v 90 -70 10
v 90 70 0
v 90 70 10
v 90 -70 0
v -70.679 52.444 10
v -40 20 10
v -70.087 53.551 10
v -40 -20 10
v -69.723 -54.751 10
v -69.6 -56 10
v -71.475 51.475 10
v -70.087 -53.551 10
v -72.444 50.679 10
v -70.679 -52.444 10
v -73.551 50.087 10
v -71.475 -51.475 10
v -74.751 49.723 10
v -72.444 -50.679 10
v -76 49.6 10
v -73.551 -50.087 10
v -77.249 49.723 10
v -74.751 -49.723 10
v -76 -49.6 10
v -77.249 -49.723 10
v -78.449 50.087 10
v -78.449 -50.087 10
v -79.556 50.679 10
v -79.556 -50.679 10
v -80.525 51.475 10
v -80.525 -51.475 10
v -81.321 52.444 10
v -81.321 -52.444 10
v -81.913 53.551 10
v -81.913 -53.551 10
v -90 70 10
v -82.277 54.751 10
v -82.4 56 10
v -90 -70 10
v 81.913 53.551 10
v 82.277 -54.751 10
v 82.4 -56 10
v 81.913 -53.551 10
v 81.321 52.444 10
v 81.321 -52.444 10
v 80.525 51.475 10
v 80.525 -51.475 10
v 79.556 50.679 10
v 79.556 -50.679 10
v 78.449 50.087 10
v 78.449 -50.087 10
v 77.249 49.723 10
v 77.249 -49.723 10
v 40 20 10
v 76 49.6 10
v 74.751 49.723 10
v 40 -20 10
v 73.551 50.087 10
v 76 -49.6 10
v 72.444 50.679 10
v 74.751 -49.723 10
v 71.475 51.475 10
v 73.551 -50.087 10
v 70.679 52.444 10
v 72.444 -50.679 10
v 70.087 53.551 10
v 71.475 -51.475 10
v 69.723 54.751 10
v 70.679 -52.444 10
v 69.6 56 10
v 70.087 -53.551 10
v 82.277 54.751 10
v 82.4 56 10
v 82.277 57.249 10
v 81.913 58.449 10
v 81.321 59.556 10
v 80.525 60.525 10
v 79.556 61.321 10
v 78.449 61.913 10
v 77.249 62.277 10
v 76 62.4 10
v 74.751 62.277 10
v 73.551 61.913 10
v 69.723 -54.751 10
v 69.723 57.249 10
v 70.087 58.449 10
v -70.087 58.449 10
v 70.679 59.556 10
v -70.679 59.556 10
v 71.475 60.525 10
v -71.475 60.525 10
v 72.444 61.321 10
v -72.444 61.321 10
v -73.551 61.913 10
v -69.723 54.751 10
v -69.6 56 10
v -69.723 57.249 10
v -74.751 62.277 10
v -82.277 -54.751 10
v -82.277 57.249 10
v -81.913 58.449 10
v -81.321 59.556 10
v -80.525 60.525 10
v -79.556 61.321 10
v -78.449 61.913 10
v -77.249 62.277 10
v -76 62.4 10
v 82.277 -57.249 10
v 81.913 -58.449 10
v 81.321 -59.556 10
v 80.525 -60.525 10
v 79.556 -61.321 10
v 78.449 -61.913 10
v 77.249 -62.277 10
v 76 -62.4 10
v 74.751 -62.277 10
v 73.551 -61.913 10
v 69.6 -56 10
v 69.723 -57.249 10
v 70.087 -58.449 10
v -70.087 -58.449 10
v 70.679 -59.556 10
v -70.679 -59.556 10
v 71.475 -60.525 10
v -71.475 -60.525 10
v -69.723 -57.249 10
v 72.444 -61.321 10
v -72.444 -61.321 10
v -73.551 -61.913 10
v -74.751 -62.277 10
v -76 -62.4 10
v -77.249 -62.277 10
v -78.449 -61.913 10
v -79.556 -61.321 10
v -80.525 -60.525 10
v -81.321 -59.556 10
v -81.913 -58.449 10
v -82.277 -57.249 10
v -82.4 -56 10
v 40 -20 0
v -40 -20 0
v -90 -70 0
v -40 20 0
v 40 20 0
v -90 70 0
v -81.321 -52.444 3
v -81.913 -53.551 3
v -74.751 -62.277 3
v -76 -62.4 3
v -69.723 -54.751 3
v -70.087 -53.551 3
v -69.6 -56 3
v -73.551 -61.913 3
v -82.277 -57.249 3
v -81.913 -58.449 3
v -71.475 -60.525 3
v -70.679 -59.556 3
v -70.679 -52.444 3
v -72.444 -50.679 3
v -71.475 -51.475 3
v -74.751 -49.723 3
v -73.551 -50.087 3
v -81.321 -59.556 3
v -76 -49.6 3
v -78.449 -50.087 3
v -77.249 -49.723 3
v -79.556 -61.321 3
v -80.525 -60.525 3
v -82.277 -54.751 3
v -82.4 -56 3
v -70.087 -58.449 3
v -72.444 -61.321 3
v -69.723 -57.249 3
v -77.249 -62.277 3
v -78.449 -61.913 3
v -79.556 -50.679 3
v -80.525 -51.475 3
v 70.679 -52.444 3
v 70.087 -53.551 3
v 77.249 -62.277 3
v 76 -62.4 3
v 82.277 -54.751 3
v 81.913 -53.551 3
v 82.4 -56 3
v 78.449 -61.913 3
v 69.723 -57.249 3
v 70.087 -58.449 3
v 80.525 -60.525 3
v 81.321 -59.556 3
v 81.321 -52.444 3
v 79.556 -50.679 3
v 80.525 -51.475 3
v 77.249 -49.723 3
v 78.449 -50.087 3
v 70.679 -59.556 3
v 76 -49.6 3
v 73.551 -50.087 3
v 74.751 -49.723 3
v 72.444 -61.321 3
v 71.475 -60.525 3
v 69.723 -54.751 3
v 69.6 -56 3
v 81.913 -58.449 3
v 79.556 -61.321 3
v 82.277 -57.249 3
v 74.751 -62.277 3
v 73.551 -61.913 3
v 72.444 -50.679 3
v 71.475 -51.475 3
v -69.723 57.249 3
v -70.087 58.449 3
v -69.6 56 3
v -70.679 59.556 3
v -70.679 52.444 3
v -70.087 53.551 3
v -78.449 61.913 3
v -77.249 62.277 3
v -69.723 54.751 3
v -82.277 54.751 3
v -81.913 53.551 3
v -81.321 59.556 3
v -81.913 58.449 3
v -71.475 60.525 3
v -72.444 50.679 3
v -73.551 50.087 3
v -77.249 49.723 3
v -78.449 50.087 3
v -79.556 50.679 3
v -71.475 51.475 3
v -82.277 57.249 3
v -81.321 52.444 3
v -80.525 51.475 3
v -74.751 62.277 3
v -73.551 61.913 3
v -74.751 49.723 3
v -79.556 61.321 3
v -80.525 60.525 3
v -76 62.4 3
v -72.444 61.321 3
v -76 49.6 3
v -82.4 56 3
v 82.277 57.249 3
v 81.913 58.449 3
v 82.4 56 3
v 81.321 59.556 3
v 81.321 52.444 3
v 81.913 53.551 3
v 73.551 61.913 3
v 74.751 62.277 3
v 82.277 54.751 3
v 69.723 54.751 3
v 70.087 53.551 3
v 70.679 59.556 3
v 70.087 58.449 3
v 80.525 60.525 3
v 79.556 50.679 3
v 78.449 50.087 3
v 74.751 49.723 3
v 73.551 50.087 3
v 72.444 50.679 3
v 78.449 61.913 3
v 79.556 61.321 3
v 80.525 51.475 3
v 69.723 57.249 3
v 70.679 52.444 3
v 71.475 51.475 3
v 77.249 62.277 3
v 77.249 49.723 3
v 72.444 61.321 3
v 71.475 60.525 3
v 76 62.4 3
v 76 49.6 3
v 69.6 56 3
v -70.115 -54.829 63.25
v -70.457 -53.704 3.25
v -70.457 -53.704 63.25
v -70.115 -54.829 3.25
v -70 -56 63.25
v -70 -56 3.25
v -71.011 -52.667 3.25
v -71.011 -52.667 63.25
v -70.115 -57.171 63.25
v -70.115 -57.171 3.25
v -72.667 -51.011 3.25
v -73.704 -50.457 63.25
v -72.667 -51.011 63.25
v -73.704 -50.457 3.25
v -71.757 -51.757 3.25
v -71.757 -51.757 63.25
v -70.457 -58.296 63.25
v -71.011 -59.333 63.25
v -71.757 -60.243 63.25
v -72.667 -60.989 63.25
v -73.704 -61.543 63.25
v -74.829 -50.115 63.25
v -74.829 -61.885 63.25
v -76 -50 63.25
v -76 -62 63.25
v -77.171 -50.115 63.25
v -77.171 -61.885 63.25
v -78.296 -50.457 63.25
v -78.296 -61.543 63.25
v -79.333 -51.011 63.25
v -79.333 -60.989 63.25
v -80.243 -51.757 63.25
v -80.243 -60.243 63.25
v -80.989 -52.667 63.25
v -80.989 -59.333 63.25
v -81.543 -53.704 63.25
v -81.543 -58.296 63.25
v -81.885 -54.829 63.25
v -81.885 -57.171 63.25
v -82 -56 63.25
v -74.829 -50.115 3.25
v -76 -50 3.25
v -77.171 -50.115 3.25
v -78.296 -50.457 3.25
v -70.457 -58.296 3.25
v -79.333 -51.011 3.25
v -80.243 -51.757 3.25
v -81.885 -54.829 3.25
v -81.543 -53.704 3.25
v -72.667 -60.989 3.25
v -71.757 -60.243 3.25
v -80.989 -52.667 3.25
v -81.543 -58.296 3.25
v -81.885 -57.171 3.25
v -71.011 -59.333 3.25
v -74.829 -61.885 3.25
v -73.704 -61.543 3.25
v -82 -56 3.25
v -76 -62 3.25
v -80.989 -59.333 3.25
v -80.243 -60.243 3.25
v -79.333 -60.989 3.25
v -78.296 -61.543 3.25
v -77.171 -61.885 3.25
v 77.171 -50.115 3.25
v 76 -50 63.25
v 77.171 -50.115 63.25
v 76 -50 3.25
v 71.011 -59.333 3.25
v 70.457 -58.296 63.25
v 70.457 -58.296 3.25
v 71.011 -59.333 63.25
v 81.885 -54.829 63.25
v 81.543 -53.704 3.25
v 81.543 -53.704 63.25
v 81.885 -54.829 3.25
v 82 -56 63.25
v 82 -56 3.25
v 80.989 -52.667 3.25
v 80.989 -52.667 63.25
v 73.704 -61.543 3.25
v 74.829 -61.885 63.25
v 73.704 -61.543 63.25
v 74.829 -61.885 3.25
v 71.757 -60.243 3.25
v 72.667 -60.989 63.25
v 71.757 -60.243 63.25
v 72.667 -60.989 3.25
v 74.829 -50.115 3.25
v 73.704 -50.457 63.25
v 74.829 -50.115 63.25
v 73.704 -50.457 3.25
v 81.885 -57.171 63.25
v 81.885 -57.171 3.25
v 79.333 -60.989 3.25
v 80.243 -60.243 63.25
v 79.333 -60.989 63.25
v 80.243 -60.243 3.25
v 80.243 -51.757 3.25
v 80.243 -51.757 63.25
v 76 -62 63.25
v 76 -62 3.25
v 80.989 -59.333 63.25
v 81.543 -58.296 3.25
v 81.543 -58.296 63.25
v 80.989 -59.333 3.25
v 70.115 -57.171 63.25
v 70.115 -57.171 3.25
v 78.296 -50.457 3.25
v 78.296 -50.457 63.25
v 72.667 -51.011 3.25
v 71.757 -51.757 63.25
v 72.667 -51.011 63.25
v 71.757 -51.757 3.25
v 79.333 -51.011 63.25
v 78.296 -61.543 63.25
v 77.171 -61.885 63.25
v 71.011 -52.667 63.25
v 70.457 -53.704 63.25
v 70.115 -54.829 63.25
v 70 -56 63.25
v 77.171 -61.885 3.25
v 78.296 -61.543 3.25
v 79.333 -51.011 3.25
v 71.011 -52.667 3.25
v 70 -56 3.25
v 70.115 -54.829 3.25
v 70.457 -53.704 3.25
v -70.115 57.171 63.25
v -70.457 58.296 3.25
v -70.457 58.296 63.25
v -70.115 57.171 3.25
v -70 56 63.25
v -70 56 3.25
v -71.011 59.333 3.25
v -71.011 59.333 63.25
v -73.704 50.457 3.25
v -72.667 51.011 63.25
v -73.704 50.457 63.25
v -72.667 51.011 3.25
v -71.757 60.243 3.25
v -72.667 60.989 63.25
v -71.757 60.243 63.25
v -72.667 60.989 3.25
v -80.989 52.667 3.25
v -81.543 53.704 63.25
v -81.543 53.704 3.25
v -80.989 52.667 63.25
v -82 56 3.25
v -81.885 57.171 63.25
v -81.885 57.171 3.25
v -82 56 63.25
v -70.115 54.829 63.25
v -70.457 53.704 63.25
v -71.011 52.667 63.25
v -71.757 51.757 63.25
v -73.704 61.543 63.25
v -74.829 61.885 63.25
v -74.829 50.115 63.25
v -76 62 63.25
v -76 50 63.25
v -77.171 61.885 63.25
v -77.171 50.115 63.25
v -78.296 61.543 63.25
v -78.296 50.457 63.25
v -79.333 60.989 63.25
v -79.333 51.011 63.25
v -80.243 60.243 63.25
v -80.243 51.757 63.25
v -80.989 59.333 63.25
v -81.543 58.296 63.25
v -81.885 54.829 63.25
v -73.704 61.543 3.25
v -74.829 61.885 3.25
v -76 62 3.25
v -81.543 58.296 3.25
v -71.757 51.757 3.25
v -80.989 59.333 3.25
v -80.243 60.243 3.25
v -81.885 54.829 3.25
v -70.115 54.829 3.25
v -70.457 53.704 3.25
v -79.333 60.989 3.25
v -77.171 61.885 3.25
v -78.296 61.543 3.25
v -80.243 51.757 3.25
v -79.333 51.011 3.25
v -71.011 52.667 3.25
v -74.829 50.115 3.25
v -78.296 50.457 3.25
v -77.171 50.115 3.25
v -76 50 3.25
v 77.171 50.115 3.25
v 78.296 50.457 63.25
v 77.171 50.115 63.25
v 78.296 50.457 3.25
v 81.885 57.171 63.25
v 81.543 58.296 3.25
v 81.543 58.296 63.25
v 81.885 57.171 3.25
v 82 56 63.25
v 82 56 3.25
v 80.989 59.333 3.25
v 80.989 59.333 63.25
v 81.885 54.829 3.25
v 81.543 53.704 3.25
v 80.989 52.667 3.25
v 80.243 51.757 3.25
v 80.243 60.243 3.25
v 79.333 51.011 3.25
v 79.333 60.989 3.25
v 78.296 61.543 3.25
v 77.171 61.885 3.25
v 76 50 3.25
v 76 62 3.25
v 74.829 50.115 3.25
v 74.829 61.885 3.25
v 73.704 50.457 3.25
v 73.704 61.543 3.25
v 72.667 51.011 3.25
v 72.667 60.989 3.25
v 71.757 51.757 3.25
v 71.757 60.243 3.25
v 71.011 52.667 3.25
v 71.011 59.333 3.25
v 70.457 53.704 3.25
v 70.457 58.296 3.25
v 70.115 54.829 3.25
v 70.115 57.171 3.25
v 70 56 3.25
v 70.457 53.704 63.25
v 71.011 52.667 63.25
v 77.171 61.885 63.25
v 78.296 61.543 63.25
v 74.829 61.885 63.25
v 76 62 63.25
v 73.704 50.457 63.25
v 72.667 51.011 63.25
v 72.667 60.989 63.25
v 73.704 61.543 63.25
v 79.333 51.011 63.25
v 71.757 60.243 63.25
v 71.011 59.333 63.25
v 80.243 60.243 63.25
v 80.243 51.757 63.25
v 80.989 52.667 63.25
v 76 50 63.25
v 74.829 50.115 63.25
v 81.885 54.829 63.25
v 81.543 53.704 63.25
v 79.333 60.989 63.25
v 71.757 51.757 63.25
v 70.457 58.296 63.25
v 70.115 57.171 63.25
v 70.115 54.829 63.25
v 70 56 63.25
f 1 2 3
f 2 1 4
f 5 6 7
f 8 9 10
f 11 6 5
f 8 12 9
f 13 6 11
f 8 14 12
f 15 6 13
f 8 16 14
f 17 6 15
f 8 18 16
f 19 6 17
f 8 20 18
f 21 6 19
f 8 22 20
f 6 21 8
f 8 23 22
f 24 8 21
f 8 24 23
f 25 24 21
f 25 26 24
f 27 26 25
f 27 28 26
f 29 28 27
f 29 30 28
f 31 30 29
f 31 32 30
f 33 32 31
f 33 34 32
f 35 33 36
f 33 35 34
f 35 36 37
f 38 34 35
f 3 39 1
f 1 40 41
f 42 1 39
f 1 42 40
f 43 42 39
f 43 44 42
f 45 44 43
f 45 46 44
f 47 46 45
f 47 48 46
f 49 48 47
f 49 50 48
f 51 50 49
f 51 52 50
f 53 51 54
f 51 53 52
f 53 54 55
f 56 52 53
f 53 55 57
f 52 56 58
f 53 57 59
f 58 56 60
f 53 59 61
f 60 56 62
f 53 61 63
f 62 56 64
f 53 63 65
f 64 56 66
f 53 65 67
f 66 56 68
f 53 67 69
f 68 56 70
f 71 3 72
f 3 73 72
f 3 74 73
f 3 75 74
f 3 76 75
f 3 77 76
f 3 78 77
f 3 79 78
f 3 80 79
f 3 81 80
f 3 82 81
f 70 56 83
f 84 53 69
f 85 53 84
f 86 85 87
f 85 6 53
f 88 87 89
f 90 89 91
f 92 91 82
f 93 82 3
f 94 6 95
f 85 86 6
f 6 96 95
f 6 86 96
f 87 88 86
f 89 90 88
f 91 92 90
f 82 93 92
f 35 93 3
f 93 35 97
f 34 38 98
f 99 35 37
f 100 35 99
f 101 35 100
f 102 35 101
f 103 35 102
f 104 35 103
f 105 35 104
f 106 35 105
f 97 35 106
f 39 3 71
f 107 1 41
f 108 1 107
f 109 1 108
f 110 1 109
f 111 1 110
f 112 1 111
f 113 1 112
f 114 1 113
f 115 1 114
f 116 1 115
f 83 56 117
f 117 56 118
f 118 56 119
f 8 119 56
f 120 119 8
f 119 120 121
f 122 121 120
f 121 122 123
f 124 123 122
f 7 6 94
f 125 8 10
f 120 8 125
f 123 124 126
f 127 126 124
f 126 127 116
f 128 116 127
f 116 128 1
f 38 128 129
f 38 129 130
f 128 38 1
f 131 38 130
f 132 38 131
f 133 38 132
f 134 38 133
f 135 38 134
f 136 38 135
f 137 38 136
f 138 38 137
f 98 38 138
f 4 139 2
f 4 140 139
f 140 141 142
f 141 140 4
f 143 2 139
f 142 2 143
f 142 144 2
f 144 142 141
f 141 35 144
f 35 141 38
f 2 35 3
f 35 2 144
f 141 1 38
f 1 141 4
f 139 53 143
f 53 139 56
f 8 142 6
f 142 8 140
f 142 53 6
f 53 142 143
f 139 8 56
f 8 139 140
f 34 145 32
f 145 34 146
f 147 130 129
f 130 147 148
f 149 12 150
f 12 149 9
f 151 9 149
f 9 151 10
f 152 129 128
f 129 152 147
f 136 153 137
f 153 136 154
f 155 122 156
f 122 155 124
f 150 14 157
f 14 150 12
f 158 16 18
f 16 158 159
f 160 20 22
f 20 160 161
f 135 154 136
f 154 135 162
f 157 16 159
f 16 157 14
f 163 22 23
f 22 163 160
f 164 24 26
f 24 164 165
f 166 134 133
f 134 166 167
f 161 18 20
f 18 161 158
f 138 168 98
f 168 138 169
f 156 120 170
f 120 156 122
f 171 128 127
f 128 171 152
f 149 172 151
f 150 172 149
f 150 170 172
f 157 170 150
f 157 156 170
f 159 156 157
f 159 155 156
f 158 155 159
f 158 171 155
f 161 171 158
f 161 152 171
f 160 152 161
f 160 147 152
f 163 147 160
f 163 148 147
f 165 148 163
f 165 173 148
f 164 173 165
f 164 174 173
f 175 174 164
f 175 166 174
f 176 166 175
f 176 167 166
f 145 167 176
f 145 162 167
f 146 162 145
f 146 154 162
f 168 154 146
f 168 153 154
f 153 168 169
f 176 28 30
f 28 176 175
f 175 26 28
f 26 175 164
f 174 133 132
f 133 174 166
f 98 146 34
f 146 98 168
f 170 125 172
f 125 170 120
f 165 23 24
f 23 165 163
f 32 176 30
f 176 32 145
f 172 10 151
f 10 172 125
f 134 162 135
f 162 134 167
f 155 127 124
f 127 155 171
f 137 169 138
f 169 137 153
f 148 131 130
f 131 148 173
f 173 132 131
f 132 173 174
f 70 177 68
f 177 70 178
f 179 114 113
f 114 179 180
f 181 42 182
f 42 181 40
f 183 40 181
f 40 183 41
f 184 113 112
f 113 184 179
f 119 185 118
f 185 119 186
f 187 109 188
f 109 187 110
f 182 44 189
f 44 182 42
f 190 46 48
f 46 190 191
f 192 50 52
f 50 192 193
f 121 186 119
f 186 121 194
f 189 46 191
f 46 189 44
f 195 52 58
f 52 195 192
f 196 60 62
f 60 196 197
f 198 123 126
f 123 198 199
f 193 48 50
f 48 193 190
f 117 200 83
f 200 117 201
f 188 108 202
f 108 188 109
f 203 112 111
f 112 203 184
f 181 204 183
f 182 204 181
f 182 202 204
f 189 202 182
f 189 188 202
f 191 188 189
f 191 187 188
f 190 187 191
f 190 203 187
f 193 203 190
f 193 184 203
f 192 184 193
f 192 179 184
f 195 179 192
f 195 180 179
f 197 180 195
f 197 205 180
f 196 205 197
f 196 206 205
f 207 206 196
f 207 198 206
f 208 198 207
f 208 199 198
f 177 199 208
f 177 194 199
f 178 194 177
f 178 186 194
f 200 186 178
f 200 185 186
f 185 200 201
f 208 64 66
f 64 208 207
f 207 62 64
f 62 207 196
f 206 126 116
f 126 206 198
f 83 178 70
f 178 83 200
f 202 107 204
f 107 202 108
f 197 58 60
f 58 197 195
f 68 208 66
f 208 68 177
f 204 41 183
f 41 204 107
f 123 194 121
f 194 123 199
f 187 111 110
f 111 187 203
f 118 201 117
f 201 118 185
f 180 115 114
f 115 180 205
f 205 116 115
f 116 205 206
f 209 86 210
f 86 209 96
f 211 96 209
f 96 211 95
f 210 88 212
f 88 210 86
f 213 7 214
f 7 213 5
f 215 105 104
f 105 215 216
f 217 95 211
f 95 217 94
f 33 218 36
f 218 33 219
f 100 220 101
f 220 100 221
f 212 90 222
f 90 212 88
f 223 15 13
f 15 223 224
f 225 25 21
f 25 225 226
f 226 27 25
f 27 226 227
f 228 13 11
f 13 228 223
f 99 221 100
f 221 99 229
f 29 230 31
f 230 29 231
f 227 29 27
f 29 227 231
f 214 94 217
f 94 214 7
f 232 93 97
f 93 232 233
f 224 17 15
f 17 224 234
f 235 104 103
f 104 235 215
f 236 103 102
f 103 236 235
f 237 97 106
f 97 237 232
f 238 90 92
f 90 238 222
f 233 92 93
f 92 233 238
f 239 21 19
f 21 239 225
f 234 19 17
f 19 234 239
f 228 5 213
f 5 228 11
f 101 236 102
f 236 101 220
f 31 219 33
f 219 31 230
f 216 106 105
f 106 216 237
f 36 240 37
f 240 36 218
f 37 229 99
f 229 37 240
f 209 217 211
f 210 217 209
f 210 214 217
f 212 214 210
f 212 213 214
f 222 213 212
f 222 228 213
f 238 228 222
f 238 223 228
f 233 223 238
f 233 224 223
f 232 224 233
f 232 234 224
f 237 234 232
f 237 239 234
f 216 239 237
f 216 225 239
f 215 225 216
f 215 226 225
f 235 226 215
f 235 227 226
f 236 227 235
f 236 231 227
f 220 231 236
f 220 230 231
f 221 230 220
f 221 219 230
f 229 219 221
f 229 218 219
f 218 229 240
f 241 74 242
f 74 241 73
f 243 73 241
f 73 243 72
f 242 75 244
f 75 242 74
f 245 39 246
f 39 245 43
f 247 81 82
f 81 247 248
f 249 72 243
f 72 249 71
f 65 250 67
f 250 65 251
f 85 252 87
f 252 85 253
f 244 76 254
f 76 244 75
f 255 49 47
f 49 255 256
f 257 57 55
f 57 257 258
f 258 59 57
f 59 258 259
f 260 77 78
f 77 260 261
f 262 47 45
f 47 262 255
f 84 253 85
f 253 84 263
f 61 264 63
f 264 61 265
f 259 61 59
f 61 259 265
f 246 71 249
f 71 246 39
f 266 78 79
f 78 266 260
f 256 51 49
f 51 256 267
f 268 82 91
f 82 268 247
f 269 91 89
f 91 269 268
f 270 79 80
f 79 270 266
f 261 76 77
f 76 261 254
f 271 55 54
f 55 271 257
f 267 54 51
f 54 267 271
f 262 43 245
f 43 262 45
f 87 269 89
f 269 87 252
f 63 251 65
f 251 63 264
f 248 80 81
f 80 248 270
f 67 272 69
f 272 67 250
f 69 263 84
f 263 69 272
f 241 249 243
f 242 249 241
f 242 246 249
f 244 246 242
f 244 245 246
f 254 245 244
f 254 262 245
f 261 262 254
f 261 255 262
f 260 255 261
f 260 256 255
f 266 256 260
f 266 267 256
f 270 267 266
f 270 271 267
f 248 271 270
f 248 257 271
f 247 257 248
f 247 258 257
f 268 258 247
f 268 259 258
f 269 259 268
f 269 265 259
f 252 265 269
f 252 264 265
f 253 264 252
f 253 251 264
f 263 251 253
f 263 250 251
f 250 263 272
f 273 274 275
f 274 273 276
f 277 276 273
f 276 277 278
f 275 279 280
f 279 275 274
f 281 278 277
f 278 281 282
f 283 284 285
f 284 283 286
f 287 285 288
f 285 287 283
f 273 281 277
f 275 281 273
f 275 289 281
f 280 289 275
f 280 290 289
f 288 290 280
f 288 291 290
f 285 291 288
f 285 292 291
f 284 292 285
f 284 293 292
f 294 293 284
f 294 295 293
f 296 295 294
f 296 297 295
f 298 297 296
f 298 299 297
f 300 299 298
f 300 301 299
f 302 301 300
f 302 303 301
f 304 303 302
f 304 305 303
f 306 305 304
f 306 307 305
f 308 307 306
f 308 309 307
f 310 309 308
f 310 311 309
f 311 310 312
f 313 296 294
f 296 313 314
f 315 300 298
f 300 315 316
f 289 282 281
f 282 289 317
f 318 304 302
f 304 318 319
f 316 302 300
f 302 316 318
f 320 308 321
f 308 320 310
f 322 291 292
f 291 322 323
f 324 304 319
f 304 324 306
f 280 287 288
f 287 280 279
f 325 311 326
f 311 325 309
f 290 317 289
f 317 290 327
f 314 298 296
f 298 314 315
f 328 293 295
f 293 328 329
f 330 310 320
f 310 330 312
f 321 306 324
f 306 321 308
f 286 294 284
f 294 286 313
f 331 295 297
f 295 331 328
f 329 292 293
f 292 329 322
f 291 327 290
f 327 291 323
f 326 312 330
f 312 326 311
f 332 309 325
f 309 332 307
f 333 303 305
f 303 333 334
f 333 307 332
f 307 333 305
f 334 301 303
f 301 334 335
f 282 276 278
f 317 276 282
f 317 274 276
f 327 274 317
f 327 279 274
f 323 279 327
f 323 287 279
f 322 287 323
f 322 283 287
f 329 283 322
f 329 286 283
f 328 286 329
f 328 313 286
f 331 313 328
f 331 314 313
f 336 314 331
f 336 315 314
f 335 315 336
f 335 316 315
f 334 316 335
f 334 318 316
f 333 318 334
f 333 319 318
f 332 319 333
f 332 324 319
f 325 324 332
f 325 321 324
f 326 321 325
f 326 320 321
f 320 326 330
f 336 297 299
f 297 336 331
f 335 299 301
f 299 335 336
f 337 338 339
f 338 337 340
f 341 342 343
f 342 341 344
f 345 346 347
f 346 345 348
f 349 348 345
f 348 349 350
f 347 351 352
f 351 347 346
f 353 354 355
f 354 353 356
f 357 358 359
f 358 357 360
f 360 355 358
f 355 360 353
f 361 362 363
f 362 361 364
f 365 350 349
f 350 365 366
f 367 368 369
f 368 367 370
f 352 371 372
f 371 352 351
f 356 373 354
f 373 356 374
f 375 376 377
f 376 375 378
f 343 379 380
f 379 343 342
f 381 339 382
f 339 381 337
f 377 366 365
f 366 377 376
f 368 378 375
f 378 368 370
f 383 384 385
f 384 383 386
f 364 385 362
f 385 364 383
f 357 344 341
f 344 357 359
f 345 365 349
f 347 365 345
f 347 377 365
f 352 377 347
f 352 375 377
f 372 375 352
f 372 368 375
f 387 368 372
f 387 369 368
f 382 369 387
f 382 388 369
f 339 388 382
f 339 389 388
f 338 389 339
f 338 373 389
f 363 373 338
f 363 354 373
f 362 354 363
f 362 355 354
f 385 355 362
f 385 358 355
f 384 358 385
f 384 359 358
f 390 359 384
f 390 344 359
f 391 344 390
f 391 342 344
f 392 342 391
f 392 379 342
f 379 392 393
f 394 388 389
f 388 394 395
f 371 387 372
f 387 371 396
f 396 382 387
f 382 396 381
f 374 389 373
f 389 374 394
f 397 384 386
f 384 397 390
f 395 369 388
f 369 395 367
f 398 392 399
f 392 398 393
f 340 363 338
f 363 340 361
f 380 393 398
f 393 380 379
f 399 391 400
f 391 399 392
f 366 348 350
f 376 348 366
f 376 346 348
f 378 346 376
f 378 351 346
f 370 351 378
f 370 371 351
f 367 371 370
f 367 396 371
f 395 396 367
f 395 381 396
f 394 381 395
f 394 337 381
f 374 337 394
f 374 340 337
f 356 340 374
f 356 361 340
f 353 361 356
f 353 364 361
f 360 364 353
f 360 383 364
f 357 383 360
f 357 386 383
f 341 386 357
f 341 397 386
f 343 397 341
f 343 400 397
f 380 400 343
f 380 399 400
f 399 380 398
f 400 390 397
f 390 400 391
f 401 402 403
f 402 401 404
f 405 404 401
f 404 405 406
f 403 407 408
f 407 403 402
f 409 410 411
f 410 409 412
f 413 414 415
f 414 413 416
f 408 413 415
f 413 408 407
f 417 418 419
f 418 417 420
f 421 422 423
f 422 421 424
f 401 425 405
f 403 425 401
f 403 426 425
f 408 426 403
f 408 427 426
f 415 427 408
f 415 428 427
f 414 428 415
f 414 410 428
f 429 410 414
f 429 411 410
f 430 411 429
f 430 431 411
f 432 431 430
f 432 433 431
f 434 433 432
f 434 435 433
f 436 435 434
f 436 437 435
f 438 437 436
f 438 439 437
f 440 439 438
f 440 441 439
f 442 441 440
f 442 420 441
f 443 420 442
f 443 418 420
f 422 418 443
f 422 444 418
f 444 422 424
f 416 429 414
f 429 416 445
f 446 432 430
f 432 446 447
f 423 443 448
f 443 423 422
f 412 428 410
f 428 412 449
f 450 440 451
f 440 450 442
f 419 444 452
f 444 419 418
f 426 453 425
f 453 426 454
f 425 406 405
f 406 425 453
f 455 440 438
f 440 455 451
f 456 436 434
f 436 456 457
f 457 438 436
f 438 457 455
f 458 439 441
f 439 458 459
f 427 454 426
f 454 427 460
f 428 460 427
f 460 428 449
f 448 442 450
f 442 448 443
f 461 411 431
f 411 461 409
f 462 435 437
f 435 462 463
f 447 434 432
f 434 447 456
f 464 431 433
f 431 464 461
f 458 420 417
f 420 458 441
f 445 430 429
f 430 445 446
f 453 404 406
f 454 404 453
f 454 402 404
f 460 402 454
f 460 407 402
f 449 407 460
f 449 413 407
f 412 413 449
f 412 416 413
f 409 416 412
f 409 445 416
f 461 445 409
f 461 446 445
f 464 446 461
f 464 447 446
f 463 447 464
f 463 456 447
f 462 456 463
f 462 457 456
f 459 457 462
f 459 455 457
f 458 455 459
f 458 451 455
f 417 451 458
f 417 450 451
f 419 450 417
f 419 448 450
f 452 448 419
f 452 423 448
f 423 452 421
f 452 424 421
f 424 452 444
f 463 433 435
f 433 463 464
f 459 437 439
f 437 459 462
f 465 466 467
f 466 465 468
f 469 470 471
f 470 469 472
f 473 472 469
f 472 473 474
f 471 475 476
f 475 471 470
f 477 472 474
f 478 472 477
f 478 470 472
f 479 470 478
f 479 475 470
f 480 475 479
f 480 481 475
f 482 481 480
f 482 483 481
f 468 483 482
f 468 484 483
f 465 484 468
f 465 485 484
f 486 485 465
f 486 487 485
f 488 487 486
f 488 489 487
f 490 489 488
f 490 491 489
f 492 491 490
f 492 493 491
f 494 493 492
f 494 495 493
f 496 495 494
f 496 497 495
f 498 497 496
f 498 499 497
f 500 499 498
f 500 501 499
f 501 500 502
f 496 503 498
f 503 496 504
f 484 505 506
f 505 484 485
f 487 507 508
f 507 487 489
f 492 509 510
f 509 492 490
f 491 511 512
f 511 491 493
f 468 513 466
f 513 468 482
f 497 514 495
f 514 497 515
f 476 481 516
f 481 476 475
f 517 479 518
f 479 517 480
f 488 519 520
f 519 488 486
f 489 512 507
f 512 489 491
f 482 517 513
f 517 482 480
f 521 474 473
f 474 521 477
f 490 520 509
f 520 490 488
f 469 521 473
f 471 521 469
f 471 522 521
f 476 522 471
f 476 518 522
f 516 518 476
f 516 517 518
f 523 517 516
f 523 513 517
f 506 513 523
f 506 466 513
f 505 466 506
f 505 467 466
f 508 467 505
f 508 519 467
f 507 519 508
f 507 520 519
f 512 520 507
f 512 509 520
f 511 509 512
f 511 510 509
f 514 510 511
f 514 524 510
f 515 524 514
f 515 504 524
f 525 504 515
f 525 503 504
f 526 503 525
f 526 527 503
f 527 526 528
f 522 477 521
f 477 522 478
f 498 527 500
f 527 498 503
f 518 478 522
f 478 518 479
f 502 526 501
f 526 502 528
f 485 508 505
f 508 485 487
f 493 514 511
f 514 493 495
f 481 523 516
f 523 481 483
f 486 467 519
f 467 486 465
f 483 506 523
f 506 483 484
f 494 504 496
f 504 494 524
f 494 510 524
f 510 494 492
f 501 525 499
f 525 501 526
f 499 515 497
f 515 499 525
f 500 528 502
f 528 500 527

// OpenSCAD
$fn = 32;

// ------------------------------------------------------------------------
// Frame with four posts: 180 x 140 mm frame, four d12 posts
// Every part is its own module, assembly() places them once.
// ------------------------------------------------------------------------

// --- part 1 ---
module base_frame() {
  difference() {
    translate([-90, -70, 0]) cube([180, 140, 10]);
    translate([-40, -20, -1]) cube([80, 40, 12]);
    translate([-76, -56, 3]) cylinder(h = 8, d = 12.8);
    translate([76, -56, 3]) cylinder(h = 8, d = 12.8);
    translate([-76, 56, 3]) cylinder(h = 8, d = 12.8);
    translate([76, 56, 3]) cylinder(h = 8, d = 12.8);
  }
}

// --- part 2 ---
module post1() {
  cylinder(h = 60, d = 12);
}

// --- part 3 ---
module post2() {
  cylinder(h = 60, d = 12);
}

// --- part 4 ---
module post3() {
  cylinder(h = 60, d = 12);
}

// --- part 5 ---
module post4() {
  cylinder(h = 60, d = 12);
}

// --- assembly ---
module assembly() {
  translate([0, 0, 0]) rotate([0, 0, 0]) base_frame();
  translate([-76, -56, 3.25]) rotate([0, 0, 0]) post1();
  translate([76, -56, 3.25]) rotate([0, 0, 0]) post2();
  translate([-76, 56, 3.25]) rotate([0, 0, 0]) post3();
  translate([76, 56, 3.25]) rotate([0, 0, 0]) post4();
}

assembly();
